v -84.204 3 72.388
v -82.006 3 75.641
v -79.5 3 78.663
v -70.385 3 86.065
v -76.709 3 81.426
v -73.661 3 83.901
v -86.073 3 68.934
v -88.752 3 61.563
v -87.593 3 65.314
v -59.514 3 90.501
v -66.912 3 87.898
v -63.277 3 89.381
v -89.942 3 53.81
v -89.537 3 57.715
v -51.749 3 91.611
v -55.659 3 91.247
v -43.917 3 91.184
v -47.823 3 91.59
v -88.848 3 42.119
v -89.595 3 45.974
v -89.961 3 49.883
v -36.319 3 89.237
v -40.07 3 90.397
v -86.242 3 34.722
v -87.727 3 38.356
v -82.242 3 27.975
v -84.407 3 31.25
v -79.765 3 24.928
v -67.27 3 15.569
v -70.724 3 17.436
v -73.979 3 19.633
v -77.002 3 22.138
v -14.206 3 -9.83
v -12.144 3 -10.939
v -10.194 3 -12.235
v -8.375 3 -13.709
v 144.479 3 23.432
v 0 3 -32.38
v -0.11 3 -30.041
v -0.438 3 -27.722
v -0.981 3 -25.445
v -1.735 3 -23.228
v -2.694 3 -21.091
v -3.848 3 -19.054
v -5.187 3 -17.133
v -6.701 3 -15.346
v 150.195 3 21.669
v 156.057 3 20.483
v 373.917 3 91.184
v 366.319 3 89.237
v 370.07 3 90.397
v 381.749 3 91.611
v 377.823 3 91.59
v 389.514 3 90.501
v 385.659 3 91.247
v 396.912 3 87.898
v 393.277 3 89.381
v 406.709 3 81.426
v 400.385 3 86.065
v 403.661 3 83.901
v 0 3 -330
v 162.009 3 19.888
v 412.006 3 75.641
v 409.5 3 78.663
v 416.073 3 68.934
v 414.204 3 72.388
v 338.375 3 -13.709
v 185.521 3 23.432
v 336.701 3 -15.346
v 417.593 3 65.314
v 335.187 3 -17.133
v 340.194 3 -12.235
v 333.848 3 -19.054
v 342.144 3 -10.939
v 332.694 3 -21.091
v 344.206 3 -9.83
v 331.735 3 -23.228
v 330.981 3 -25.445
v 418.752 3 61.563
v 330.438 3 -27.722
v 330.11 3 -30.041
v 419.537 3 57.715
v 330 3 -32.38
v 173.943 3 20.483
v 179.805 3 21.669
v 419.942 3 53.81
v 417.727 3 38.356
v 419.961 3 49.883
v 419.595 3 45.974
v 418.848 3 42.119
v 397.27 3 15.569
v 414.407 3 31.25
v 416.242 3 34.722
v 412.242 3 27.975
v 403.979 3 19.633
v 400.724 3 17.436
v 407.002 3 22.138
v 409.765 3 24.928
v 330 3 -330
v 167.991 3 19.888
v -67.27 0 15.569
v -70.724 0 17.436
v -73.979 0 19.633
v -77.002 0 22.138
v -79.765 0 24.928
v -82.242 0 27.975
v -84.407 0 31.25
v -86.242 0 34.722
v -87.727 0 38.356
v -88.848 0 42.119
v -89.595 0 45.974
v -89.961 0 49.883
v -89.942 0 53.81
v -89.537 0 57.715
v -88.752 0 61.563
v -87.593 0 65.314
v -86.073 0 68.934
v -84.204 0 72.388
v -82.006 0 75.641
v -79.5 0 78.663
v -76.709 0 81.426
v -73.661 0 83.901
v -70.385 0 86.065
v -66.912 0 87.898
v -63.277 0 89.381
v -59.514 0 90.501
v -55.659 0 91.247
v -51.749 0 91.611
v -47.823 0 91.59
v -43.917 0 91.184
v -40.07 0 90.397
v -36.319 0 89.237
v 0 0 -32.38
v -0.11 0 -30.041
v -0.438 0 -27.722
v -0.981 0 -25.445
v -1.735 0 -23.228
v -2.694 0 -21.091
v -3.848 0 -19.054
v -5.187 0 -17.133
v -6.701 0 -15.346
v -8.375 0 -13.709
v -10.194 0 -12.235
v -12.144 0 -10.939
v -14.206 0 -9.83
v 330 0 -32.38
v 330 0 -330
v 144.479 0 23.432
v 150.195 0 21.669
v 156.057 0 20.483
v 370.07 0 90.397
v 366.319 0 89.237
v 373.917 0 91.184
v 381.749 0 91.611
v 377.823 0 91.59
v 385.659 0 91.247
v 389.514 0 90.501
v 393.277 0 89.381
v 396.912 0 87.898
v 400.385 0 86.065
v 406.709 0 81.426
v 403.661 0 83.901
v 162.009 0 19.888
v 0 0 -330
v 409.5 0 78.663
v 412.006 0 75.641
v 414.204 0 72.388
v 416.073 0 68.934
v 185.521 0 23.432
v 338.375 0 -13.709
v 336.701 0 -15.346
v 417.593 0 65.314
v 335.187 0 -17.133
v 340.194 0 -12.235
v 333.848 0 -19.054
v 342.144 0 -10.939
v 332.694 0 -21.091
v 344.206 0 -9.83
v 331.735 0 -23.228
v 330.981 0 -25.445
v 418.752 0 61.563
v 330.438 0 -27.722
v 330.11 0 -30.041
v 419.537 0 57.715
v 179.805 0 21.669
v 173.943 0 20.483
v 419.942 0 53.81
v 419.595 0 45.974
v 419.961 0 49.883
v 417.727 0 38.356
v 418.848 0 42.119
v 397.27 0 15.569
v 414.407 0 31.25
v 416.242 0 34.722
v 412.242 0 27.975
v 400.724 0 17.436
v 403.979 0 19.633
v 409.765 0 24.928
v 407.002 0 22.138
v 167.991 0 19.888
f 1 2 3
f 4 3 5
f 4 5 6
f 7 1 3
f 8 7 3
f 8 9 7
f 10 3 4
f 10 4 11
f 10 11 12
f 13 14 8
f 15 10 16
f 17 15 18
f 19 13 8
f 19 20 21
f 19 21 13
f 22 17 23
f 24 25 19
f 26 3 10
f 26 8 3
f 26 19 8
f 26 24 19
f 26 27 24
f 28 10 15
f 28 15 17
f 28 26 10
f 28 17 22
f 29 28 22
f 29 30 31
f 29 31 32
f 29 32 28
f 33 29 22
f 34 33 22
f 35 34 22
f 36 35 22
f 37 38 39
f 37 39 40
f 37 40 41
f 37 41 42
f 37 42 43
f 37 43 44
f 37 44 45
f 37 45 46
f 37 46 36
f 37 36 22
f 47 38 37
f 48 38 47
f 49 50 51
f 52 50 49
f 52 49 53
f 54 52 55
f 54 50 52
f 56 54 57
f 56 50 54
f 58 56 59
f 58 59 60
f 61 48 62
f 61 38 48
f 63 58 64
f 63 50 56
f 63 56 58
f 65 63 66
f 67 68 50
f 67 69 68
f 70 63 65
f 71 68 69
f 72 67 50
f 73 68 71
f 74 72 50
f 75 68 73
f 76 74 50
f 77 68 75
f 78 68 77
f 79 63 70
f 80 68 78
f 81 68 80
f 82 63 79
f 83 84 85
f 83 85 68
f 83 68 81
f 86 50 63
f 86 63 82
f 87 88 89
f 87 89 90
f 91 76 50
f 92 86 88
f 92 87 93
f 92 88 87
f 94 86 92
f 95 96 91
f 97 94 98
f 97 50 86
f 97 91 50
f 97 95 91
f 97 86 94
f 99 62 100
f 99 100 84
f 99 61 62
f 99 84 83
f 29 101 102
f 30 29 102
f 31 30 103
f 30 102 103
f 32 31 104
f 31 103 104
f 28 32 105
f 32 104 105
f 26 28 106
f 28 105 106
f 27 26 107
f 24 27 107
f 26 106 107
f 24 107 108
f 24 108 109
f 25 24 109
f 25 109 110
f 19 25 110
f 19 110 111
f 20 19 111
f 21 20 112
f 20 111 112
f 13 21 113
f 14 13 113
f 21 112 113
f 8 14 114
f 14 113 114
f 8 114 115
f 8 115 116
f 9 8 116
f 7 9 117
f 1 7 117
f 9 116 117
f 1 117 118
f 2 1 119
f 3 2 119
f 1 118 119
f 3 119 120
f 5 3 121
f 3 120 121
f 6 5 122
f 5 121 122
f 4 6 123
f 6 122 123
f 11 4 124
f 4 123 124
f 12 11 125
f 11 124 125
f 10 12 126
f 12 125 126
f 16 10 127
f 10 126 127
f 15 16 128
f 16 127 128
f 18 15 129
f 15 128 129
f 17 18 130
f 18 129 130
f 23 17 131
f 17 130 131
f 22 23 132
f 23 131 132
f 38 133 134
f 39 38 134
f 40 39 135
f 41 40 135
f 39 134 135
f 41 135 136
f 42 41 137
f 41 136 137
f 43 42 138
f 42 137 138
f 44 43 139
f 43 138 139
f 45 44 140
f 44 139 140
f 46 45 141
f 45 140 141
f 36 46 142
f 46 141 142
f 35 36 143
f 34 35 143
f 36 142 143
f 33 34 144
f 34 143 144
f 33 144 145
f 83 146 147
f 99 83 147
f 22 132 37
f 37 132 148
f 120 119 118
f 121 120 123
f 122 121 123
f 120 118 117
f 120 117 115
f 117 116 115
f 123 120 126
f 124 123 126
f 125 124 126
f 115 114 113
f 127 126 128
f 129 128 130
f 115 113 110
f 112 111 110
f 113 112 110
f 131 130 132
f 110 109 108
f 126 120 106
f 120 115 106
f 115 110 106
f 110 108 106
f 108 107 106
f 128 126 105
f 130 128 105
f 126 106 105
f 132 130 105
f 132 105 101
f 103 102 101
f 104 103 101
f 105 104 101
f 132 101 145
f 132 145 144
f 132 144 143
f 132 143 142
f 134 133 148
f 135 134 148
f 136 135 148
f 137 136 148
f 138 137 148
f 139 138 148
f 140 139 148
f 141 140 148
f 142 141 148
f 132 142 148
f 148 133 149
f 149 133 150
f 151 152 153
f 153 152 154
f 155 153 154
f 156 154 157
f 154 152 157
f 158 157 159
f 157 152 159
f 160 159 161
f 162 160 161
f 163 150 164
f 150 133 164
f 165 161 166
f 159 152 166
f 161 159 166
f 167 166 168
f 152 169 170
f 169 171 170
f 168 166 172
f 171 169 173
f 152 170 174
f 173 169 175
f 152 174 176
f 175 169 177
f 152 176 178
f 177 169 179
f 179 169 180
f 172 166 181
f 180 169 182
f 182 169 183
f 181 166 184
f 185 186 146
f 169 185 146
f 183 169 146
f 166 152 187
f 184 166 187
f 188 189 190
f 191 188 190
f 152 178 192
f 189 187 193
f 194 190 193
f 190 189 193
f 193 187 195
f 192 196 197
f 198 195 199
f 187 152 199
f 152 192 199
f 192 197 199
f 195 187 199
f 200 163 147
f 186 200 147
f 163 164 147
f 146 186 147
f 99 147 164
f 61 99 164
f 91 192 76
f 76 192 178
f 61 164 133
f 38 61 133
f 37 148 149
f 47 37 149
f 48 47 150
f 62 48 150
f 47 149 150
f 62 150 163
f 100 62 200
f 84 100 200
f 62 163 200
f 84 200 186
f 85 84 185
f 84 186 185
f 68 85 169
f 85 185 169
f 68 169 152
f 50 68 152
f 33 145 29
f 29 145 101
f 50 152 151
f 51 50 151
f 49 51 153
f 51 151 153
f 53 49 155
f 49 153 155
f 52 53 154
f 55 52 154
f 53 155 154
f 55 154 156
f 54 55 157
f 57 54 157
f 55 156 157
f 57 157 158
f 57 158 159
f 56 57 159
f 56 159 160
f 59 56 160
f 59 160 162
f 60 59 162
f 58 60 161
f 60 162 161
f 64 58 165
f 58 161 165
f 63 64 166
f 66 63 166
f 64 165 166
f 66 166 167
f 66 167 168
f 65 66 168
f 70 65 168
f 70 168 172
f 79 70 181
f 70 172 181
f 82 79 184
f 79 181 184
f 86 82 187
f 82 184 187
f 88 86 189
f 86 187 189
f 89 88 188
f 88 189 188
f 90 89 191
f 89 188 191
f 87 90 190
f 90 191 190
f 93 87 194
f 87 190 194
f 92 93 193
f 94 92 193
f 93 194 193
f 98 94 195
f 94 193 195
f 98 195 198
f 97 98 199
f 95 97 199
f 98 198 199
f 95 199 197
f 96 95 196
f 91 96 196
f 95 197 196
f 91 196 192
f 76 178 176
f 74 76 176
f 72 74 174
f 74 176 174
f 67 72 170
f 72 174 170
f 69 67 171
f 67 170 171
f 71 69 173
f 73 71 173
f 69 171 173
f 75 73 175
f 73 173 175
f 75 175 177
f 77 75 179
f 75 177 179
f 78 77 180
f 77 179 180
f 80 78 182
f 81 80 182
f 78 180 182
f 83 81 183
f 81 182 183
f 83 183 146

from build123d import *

# Parameters (mm, degrees)
BOSS_EXTRUDE1_DEPTH = 3


with BuildPart() as part:
    # Sketch3 → Boss-Extrude1 (new body)
    with BuildSketch(Plane(origin=(0, 0, 0), x_dir=(1, 0, 0), z_dir=(0, 1, 0))):
        with BuildLine():
            Line((-36.319194267, -89.236860887), (144.478790315, -23.431776084))
            ThreePointArc((144.478790315, -23.431776084), (165.000000077, -19.813332936), (185.52120983, -23.431776136))
            Line((185.52120983, -23.431776136), (366.319192052, -89.236860081))
            ThreePointArc((366.319192052, -89.236860081), (416.877444894, -67.142834059), (397.269838057, -15.569346002))
            Line((397.269838057, -15.569346002), (344.206351456, 9.829836443))
            ThreePointArc((344.206351456, 9.829836443), (333.847680817, 19.053826006), (330, 32.379717841))
            Line((330, 32.379717841), (330, 330))
            Line((330, 330), (0, 330))
            Line((0, 330), (0, 32.379717841))
            ThreePointArc((0, 32.379717841), (-3.847681031, 19.053825667), (-14.206352179, 9.829836096))
            Line((-14.206352179, 9.829836096), (-67.269835876, -15.569344958))
            ThreePointArc((-67.269835876, -15.569344958), (-86.877445819, -67.142831858), (-36.319194267, -89.236860887))
        make_face()
    extrude(amount=BOSS_EXTRUDE1_DEPTH)


solid = part.part
